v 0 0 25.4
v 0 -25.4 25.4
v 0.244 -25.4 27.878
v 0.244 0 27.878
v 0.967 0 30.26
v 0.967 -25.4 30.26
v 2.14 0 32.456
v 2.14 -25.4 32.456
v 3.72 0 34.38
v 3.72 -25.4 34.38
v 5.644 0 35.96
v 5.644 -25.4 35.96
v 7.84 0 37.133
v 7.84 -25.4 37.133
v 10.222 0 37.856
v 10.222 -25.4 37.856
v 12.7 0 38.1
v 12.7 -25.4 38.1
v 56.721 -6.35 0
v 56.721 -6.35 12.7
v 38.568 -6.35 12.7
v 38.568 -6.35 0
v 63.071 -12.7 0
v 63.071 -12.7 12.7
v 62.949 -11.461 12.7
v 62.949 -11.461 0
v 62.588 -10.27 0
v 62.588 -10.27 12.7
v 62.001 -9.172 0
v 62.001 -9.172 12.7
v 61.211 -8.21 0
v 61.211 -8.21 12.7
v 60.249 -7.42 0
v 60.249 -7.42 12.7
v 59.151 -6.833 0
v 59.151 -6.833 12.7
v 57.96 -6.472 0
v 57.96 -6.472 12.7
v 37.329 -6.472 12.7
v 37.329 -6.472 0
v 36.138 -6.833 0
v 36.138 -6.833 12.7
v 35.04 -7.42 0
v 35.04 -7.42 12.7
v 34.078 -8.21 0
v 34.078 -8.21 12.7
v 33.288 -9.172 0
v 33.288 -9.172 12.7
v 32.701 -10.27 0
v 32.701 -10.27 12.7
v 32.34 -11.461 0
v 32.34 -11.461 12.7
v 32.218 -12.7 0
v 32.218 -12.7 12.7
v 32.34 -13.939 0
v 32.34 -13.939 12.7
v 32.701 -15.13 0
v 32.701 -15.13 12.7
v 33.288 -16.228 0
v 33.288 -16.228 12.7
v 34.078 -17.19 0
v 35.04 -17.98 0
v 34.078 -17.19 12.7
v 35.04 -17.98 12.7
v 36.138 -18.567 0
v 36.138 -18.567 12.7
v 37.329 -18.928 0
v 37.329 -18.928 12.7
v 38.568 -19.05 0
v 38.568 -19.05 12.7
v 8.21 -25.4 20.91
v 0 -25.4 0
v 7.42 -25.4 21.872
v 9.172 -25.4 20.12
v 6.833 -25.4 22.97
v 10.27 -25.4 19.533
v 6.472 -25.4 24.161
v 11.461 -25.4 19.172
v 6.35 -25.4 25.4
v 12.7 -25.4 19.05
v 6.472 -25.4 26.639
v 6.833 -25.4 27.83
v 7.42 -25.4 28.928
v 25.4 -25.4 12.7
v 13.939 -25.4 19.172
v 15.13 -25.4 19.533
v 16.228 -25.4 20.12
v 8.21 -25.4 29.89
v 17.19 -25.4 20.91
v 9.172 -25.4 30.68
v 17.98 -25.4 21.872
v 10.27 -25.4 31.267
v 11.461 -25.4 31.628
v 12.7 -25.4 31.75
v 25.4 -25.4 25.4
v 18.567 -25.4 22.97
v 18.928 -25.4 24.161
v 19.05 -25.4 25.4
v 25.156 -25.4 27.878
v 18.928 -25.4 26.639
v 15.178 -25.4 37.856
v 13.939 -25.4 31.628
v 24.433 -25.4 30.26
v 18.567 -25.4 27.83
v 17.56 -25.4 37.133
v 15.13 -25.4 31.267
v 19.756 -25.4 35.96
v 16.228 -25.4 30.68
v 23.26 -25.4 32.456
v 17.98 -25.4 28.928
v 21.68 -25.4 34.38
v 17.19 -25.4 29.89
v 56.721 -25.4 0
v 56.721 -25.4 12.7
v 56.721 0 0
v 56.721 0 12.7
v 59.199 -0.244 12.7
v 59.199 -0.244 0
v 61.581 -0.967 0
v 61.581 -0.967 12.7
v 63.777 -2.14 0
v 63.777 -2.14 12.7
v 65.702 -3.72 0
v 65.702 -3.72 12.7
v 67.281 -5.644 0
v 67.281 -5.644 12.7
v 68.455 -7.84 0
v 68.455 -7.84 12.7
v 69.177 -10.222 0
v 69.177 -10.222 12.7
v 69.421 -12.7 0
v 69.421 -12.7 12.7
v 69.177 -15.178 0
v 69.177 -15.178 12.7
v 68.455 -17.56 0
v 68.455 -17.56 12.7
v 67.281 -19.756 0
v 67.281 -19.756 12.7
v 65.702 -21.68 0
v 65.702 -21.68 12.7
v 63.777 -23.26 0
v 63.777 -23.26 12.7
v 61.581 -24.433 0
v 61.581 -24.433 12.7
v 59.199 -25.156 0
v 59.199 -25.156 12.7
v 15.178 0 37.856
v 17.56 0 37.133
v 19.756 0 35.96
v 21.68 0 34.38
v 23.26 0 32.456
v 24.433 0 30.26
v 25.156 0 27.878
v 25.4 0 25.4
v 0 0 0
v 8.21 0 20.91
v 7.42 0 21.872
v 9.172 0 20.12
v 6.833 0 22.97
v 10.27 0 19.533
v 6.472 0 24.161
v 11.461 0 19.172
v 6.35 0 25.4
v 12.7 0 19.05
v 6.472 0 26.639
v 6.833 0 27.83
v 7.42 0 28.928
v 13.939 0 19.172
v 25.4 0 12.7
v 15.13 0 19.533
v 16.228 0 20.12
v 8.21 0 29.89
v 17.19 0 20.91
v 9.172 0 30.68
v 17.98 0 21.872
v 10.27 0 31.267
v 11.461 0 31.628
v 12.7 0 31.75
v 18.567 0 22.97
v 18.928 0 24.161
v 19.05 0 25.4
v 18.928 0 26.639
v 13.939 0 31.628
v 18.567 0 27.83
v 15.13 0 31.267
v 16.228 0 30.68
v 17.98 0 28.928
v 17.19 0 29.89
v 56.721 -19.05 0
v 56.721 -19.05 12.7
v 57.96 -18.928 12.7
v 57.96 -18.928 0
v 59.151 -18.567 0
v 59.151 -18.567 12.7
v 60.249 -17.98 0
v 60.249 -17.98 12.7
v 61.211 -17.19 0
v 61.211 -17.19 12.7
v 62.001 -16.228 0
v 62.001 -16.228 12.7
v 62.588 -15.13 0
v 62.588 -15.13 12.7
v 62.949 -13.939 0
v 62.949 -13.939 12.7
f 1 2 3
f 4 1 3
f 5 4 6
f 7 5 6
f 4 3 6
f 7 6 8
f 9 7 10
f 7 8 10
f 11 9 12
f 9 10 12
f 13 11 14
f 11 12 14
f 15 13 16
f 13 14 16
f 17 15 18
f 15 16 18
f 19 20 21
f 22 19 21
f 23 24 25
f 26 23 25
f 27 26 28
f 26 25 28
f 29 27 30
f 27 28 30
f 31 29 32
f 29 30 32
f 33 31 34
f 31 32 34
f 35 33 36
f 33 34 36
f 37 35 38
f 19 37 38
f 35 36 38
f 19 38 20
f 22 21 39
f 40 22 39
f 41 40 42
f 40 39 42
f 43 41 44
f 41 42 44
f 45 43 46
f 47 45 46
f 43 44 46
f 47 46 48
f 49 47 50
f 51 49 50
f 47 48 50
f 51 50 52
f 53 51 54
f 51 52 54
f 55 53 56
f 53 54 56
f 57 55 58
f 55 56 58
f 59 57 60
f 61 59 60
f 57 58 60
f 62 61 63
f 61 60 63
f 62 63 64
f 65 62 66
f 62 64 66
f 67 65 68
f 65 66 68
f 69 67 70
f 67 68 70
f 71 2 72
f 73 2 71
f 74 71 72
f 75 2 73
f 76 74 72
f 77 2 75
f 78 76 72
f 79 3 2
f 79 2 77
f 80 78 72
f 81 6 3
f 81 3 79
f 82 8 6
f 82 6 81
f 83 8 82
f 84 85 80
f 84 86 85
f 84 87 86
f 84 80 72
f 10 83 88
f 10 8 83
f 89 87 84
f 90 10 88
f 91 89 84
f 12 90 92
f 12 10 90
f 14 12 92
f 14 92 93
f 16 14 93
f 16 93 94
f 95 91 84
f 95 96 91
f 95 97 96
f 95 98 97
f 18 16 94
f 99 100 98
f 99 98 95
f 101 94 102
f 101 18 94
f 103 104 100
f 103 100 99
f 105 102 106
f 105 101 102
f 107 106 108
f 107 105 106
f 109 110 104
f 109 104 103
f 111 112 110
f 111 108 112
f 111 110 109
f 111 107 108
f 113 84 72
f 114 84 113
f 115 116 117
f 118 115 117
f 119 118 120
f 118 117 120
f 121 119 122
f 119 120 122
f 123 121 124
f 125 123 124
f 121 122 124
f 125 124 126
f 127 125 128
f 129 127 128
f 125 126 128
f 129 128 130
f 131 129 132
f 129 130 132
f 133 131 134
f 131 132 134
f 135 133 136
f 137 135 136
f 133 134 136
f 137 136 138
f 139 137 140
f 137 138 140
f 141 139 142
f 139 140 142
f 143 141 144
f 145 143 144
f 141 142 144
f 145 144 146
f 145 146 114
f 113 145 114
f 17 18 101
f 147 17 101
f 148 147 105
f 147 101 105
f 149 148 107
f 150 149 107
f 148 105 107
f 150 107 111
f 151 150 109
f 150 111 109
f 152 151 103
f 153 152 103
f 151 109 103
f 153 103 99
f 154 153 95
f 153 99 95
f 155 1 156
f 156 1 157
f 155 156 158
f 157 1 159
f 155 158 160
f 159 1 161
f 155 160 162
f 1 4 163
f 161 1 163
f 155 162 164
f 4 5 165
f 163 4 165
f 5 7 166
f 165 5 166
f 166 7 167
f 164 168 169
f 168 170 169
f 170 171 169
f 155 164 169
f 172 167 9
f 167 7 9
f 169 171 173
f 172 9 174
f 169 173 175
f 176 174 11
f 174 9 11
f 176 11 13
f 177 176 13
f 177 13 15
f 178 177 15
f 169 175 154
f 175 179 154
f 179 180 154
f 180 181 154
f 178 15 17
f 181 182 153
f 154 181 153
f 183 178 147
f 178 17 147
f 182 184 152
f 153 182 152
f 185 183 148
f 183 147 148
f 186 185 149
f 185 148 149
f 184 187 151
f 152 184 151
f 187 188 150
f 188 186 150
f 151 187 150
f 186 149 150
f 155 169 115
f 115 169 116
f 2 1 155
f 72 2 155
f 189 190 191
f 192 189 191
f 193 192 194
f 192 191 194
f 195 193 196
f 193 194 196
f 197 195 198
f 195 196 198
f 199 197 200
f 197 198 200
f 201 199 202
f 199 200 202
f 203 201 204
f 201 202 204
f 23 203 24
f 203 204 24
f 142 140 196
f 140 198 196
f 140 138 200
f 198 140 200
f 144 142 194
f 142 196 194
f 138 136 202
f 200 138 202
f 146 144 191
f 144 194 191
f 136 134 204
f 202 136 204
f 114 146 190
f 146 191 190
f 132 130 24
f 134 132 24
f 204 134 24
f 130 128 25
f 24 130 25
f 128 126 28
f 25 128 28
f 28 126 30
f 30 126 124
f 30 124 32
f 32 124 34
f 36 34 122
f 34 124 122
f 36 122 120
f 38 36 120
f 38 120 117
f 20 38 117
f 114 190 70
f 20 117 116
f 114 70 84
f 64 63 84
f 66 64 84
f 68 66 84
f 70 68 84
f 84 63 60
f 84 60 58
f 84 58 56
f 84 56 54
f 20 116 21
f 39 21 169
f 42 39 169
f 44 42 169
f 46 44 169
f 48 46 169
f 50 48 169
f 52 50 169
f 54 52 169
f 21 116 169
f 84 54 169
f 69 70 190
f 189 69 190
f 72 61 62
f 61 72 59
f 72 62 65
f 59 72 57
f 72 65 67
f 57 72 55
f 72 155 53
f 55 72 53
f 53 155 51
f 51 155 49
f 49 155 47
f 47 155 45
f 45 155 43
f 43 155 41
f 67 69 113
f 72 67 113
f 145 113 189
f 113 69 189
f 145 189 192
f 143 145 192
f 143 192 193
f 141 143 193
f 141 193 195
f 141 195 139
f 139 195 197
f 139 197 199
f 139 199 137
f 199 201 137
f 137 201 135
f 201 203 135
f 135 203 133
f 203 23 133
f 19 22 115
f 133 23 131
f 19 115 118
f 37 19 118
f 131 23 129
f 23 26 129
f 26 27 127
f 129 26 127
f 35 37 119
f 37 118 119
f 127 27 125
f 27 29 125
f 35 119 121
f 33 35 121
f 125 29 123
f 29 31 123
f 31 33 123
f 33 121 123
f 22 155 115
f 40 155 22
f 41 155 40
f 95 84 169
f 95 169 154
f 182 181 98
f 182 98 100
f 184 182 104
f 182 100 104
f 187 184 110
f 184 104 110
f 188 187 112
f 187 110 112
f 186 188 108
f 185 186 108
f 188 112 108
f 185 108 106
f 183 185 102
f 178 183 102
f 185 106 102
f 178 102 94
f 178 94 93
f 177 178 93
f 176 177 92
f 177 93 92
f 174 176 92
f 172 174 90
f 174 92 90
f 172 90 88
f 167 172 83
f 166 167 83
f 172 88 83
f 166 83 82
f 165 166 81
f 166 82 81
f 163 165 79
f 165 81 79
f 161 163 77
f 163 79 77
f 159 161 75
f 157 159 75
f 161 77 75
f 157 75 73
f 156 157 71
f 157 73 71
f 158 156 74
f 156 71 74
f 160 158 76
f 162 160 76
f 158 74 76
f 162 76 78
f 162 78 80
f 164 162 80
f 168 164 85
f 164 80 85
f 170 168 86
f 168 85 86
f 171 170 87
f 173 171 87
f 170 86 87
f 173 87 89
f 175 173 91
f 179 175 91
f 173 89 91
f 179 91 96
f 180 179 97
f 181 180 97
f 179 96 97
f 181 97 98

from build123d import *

# Parameters (mm, degrees)
F1_DEPTH = 25.4
F2_R     = 6.35
F3_DEPTH = 25.4
F5_DEPTH = 12.7


with BuildPart() as f1:
    # F0 (on Front) → F1 (new body)
    with BuildSketch(Plane.XZ):
        Polygon((0, 38.1), (0, 0), (69.85, 0), (69.85, 12.7), (25.4, 12.7), (25.4, 38.1), align=None)
    extrude(amount=F1_DEPTH)

    # F2 (on face) → F3 (cut)
    with BuildSketch(Plane.XZ.offset(25.4)):
        with Locations((12.7, 25.4)):
            Circle(F2_R)
        with BuildLine():
            ThreePointArc((12.7, 38.1), (21.680256, 34.380256), (25.4, 25.4))
            Line((25.4, 25.4), (25.4, 38.1))
            Line((25.4, 38.1), (12.7, 38.1))
        make_face()
        with BuildLine():
            ThreePointArc((0, 25.4), (3.719744, 34.380256), (12.7, 38.1))
            Line((12.7, 38.1), (0, 38.1))
            Line((0, 38.1), (0, 25.4))
        make_face()
    extrude(amount=-F3_DEPTH, mode=Mode.SUBTRACT)

    # F4 (on face) → F5 (cut)
    with BuildSketch(Plane.XY.offset(12.7)):
        with BuildLine():
            ThreePointArc((44.918065, -12.7), (43.058193, -8.209872), (38.568065, -6.35))
            ThreePointArc((38.568065, -6.35), (32.218065, -12.7), (38.568065, -19.05))
            ThreePointArc((38.568065, -19.05), (43.058193, -17.190128), (44.918065, -12.7))
        make_face()
        with BuildLine():
            ThreePointArc((56.72131, -19.05), (50.37131, -12.7), (56.72131, -6.35))
            Line((56.72131, -6.35), (38.568065, -6.35))
            ThreePointArc((38.568065, -6.35), (43.058193, -8.209872), (44.918065, -12.7))
            ThreePointArc((44.918065, -12.7), (43.058193, -17.190128), (38.568065, -19.05))
            Line((38.568065, -19.05), (56.72131, -19.05))
        make_face()
        with BuildLine():
            ThreePointArc((56.72131, -19.05), (61.211438, -17.190128), (63.07131, -12.7))
            ThreePointArc((63.07131, -12.7), (61.211438, -8.209872), (56.72131, -6.35))
            ThreePointArc((56.72131, -6.35), (50.37131, -12.7), (56.72131, -19.05))
        make_face()
        with BuildLine():
            ThreePointArc((56.72131, 0), (69.42131, -12.7), (56.72131, -25.4))
            Line((56.72131, -25.4), (69.85, -25.4))
            Line((69.85, -25.4), (69.85, 0))
            Line((69.85, 0), (56.72131, 0))
        make_face()
    extrude(amount=-F5_DEPTH, mode=Mode.SUBTRACT)


solid = f1.part
